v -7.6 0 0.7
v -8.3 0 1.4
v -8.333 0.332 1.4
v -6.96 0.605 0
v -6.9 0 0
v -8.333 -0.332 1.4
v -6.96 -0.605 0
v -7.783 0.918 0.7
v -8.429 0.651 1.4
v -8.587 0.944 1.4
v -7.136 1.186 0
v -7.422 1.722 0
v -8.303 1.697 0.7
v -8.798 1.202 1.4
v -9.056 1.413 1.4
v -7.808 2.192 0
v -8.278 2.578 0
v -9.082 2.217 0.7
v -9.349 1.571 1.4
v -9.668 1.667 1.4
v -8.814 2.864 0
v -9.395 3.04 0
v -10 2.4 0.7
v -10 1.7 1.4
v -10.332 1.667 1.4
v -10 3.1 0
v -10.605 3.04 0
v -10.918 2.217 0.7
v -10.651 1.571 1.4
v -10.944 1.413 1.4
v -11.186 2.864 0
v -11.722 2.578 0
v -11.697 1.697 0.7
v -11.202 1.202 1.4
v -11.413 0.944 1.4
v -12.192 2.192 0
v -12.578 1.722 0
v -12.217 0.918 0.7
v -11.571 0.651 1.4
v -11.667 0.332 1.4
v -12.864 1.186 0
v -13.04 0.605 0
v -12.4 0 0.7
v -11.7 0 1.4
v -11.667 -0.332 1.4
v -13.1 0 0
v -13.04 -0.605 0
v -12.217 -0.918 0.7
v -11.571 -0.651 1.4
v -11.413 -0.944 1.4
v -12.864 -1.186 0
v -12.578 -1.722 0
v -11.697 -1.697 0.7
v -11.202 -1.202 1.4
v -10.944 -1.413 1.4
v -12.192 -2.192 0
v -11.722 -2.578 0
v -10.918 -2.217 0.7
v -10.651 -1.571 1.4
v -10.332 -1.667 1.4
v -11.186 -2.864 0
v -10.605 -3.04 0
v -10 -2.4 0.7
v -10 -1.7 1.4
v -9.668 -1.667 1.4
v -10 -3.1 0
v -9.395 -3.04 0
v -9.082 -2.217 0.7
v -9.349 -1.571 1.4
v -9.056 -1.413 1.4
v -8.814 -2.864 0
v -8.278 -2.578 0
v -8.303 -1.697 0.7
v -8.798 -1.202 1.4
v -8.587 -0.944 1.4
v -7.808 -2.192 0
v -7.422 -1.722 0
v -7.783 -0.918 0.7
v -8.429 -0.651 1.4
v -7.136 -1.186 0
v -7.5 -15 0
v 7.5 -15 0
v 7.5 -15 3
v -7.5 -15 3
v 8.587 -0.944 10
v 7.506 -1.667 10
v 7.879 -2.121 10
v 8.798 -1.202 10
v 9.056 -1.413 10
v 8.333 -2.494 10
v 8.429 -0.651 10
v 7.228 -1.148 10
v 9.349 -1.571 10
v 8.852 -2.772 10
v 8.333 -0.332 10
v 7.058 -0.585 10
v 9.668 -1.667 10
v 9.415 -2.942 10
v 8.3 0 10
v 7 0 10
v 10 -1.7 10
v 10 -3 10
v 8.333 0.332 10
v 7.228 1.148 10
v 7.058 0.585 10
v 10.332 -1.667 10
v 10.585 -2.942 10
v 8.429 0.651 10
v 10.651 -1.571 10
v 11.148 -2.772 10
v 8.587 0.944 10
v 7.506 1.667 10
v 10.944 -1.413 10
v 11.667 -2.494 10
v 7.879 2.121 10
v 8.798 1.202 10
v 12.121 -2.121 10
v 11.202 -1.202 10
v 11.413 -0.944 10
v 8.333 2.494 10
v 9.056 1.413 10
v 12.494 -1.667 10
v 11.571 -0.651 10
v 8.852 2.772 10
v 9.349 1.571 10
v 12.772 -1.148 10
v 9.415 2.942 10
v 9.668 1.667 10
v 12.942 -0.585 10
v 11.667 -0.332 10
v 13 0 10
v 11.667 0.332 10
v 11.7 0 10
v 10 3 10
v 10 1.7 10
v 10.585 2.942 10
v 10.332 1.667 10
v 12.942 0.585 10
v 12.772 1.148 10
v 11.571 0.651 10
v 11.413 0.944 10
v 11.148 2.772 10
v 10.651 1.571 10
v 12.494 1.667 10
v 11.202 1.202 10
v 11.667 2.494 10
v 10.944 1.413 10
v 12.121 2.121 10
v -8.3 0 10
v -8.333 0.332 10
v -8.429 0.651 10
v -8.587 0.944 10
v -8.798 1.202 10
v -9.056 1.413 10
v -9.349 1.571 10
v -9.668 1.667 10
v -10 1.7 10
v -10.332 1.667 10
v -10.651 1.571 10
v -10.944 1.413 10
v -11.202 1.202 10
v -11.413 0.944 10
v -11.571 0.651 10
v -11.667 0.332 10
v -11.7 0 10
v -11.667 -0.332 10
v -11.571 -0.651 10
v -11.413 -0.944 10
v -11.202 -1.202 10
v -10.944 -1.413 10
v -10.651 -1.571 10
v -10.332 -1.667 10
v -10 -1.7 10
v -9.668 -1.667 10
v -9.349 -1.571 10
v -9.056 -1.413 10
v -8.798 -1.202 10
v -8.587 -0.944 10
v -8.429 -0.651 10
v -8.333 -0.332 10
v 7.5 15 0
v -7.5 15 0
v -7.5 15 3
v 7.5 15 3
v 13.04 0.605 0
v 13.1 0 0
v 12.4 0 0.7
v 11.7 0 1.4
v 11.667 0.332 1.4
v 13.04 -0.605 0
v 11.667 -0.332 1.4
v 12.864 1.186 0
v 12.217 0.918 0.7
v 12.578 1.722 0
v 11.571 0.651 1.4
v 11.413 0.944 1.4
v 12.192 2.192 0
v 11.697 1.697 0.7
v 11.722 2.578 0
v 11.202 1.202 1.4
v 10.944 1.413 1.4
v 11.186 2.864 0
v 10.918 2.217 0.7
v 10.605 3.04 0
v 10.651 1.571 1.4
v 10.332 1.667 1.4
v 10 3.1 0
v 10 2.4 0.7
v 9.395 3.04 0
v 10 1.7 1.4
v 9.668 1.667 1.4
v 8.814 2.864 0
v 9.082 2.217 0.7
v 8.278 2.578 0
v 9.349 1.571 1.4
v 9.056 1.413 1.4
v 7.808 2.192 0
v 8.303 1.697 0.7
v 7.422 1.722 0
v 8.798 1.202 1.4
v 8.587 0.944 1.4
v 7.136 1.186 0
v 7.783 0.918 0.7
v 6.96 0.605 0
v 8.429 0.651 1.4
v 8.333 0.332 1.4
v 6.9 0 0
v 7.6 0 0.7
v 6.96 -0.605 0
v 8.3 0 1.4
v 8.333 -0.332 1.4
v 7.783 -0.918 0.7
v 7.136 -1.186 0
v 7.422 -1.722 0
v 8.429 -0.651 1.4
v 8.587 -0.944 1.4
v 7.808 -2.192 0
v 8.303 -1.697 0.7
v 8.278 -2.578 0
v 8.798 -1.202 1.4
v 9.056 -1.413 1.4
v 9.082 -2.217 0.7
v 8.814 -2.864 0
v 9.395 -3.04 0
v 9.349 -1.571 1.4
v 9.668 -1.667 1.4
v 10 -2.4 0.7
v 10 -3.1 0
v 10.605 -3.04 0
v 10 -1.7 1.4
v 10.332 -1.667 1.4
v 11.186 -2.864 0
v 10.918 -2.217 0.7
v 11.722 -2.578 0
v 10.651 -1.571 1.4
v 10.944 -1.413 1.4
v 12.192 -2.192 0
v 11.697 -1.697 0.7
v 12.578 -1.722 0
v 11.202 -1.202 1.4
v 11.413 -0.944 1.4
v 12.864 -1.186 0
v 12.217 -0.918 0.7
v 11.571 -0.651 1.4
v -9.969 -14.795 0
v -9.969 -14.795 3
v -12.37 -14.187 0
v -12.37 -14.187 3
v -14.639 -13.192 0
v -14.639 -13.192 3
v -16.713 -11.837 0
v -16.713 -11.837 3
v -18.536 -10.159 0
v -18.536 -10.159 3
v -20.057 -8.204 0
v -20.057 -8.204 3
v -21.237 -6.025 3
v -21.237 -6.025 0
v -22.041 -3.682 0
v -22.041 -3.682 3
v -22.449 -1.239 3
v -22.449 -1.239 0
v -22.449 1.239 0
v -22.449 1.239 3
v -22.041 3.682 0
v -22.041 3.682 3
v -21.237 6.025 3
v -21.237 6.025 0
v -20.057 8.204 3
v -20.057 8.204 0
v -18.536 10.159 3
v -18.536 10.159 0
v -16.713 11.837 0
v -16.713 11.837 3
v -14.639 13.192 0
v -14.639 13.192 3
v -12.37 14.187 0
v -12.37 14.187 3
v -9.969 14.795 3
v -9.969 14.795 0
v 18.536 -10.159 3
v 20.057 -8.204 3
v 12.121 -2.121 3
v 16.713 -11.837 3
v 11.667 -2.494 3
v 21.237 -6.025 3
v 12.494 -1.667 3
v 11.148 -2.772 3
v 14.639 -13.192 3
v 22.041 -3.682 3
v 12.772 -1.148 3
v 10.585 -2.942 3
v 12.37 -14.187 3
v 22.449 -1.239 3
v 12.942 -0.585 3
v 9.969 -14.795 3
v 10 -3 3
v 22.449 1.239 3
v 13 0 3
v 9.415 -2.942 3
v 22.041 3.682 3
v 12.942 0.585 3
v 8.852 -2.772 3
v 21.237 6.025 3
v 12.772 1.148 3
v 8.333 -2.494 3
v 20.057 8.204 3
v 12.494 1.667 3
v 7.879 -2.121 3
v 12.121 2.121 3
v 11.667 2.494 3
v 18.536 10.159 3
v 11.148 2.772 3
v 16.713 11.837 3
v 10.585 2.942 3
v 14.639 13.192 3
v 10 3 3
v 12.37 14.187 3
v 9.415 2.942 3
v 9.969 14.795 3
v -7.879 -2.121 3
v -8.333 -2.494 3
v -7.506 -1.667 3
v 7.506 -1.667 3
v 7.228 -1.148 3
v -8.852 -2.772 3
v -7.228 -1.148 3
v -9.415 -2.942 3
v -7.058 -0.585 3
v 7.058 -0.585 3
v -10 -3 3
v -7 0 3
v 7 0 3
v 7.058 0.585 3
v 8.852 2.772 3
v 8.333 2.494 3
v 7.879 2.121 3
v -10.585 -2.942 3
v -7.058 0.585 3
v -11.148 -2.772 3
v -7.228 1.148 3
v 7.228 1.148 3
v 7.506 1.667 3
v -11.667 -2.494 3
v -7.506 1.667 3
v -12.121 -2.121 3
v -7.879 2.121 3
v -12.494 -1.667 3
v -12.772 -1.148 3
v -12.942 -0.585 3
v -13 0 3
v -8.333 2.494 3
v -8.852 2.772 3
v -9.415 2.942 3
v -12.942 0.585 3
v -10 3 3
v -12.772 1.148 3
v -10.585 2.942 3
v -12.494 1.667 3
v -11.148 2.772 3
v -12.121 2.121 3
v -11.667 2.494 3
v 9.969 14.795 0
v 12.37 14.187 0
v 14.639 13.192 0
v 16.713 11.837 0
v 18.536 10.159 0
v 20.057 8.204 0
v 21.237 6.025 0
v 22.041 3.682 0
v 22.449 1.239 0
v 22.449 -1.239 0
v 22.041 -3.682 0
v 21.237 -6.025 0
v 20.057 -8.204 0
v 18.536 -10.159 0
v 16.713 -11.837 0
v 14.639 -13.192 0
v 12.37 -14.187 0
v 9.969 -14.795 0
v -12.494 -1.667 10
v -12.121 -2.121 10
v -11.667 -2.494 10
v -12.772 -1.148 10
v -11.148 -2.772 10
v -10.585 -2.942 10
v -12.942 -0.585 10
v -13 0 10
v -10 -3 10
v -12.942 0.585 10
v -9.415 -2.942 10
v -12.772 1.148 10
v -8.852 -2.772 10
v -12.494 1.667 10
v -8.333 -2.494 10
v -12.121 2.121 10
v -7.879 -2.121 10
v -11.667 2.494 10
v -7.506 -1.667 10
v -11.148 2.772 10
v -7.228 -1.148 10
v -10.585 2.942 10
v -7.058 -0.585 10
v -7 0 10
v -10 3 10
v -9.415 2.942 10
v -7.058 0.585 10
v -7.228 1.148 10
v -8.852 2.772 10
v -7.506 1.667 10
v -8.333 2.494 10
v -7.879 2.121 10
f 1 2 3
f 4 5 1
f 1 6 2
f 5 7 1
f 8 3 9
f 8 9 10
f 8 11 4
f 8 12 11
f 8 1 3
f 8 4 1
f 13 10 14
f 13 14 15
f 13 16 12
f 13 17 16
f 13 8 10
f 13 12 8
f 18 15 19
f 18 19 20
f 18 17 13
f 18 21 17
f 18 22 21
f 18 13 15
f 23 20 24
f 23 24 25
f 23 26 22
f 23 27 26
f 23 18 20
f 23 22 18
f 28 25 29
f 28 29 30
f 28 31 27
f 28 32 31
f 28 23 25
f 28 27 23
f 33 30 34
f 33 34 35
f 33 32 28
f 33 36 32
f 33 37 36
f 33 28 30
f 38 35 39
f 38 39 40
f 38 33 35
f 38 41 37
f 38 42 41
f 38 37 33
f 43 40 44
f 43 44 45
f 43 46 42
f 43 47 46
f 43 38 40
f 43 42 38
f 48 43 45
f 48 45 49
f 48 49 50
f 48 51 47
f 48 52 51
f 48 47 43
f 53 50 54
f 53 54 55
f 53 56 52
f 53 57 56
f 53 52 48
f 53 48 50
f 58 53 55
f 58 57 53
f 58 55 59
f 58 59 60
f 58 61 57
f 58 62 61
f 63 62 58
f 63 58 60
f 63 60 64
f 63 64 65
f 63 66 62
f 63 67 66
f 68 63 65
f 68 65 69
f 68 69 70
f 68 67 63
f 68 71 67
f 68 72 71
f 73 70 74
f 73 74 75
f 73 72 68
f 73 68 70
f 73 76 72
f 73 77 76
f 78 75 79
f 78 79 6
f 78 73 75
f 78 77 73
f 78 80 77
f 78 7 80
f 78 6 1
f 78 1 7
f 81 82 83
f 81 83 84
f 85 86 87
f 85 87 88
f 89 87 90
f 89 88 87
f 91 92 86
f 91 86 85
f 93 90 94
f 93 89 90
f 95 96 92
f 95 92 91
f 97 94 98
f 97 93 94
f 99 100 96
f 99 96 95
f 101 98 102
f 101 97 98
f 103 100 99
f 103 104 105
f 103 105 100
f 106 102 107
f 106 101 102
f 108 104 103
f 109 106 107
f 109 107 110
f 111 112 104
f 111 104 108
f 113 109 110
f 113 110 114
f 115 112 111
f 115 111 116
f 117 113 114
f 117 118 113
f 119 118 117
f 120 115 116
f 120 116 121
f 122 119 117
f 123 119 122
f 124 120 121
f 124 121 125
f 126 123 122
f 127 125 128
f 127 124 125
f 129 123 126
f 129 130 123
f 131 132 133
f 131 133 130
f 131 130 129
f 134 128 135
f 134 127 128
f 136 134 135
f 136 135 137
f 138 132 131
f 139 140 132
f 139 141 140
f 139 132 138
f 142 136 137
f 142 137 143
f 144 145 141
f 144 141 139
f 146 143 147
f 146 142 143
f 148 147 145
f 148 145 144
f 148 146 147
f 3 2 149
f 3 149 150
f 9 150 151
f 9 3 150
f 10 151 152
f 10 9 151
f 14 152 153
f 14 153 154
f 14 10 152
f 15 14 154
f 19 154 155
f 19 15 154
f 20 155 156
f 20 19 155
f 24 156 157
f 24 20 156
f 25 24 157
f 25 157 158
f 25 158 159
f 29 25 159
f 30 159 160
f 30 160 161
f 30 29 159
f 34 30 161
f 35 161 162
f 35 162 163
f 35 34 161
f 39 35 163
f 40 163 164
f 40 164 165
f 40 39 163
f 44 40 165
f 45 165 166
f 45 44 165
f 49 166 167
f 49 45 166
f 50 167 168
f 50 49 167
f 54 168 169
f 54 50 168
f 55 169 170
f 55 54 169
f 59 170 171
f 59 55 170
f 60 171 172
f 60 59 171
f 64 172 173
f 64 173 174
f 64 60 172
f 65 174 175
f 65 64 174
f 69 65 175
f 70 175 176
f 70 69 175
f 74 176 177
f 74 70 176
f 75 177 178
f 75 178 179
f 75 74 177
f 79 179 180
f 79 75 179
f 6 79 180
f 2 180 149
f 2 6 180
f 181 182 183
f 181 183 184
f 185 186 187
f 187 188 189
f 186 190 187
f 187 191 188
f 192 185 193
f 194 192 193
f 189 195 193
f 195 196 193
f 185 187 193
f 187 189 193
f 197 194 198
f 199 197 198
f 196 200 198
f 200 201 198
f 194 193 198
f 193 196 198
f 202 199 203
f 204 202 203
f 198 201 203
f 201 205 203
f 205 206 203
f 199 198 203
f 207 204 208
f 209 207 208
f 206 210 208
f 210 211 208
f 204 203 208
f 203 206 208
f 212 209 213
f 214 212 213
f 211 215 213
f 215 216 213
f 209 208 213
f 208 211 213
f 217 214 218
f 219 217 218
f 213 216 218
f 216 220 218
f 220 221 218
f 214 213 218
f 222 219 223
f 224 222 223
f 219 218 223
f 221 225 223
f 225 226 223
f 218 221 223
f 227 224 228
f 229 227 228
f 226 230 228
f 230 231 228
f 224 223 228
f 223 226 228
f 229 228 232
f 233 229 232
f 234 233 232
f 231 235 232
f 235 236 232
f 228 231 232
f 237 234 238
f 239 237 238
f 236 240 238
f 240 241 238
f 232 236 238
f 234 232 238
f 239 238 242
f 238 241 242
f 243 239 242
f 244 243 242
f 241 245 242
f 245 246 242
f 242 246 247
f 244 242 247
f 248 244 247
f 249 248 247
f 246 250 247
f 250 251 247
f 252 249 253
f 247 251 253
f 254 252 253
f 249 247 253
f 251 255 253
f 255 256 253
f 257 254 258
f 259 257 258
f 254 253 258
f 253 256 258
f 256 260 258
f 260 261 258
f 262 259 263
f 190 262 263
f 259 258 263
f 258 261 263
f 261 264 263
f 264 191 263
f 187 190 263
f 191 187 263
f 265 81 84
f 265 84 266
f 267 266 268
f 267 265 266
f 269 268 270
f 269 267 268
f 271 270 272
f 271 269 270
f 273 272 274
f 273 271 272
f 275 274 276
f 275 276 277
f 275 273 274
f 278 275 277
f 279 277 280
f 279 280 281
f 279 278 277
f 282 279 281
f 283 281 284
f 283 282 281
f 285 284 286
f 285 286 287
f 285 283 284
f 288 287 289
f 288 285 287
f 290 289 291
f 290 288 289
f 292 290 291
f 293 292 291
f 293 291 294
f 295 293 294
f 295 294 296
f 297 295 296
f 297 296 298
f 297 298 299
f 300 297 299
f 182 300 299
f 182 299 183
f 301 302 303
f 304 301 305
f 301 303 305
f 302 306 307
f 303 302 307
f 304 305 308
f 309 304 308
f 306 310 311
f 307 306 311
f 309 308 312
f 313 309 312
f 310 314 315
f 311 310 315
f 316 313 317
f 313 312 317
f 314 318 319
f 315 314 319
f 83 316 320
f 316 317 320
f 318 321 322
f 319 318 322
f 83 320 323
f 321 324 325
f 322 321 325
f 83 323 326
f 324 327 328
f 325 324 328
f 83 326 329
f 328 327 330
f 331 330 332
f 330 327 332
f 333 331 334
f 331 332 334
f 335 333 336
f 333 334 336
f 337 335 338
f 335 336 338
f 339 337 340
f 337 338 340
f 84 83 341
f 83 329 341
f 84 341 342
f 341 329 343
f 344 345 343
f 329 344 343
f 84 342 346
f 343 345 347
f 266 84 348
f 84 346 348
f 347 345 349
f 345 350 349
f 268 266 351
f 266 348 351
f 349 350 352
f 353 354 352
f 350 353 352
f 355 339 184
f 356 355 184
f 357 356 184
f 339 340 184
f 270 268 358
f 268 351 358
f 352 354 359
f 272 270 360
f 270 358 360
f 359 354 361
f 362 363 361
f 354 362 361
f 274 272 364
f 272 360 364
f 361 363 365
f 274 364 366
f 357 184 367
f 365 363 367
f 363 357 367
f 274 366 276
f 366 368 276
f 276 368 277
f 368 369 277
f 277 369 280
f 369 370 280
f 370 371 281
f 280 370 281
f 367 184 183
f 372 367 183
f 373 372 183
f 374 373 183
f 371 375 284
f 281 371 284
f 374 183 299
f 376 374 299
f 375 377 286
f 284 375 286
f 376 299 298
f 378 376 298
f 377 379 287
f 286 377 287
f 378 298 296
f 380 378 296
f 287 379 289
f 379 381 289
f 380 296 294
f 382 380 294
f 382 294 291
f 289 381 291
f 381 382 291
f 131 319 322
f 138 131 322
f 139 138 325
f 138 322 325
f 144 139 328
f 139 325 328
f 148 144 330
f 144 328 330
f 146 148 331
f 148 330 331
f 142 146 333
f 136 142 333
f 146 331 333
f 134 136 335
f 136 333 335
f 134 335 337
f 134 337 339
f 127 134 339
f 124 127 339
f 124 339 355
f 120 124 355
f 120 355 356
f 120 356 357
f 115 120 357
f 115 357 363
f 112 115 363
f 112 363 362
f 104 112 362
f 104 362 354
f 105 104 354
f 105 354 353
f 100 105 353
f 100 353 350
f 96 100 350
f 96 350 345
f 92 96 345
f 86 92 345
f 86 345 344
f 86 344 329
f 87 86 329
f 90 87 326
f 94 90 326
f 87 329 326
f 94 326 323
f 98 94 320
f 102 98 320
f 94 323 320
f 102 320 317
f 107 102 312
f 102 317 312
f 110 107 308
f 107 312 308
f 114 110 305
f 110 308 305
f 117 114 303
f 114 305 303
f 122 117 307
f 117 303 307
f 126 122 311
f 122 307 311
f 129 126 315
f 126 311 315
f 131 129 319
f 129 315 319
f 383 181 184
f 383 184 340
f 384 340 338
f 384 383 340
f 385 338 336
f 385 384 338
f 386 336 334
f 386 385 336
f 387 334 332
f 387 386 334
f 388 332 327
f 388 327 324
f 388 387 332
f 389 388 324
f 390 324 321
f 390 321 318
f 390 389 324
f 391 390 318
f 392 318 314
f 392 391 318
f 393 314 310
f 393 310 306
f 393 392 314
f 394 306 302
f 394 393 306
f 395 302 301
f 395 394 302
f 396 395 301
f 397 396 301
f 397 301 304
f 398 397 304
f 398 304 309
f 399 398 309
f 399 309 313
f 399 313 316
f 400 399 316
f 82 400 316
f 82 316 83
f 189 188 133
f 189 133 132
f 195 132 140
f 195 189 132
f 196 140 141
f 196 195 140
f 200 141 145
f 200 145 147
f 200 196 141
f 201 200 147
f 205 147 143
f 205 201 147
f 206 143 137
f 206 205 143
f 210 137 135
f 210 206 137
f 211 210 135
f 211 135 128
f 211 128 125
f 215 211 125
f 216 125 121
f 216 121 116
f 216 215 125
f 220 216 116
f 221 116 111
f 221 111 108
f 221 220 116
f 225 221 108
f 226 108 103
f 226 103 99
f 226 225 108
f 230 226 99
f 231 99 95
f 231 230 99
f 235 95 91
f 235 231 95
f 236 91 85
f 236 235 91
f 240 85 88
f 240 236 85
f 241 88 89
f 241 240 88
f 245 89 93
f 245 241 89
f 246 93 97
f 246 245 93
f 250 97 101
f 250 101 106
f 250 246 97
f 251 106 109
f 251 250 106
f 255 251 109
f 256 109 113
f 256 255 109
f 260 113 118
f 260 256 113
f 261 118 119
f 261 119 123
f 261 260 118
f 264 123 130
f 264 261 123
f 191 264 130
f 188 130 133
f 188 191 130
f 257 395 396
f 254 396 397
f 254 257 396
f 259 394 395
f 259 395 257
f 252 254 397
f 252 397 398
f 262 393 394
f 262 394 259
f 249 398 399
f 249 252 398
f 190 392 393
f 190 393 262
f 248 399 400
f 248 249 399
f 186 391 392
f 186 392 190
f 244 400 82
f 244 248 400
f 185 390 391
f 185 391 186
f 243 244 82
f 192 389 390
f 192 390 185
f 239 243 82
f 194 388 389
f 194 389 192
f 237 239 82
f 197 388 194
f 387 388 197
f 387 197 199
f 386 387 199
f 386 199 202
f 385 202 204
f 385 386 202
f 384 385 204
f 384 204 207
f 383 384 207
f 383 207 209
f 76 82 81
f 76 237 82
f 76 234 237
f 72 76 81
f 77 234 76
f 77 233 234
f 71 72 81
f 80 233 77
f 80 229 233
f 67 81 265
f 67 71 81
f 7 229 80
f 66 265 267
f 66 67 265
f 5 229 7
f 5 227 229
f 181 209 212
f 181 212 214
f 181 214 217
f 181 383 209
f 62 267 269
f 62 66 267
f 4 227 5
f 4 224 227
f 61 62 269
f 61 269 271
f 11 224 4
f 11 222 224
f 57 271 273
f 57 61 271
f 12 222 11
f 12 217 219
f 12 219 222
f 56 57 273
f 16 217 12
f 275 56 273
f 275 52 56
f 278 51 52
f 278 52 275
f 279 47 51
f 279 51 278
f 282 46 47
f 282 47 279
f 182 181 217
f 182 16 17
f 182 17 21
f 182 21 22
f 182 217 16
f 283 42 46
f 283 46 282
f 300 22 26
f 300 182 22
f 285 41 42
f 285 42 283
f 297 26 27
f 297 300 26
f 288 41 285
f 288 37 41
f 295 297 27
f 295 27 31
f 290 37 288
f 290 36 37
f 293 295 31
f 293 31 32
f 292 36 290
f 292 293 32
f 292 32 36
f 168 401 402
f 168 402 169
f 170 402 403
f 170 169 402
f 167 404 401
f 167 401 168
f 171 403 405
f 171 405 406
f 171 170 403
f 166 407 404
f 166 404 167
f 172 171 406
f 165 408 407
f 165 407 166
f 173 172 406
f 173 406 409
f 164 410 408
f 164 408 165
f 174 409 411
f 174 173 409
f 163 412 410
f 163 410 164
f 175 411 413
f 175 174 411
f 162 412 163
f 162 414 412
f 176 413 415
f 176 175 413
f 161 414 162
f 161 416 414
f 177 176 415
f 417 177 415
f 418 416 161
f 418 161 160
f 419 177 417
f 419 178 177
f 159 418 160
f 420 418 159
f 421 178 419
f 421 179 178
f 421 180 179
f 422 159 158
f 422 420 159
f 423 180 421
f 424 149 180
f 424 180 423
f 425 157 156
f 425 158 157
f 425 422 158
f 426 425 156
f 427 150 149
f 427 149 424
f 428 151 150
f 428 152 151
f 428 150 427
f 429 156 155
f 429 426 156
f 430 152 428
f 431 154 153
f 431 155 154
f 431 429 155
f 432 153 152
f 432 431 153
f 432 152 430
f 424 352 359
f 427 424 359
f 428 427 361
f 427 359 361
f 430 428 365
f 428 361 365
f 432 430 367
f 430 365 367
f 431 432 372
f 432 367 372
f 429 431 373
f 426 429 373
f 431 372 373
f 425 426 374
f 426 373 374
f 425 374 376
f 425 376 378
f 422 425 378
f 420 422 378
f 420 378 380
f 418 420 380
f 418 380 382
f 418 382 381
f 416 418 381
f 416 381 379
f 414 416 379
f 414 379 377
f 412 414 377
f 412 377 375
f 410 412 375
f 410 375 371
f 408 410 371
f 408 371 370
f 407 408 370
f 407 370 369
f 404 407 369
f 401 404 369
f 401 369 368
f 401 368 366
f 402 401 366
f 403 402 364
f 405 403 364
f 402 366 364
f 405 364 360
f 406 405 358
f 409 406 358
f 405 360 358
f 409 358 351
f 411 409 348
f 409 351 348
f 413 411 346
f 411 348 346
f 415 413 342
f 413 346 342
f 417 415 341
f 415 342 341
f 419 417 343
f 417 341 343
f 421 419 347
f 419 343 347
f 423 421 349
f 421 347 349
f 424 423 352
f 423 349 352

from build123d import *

# Parameters (mm, degrees)
SKETCH_1_R      = 3
EXTRUDE_1_DEPTH = 3
SKETCH_1_3_R    = 3
SKETCH_1_3_R_2  = 1.7
EXTRUDE_2_DEPTH = 10
CHAMFER_1_SIZE  = 1.4


with BuildPart() as part:
    # 草图1 → 凸台-拉伸1 (new body)
    with BuildSketch(Plane.XY):
        with BuildLine():
            Line((7.5, 15), (-7.5, 15))
            ThreePointArc((-7.5, 15), (-22.5, 0), (-7.5, -15))
            Line((-7.5, -15), (7.5, -15))
            ThreePointArc((7.5, -15), (22.5, 0), (7.5, 15))
        make_face()
        with Locations((-10, 0)):
            Circle(SKETCH_1_R, mode=Mode.SUBTRACT)
        with Locations((10, 0)):
            Circle(SKETCH_1_R, mode=Mode.SUBTRACT)
    extrude(amount=EXTRUDE_1_DEPTH)

    # 草图1<3> → 凸台-拉伸2 (add)
    # profile 1 of 2: a face of its own
    with BuildSketch(Plane.XY):
        with Locations((-10, 0)):
            Circle(SKETCH_1_3_R)
        with Locations((-10, 0)):
            Circle(SKETCH_1_3_R_2, mode=Mode.SUBTRACT)
    # profile 2 of 2: a face of its own
    with BuildSketch(Plane.XY):
        with Locations((10, 0)):
            Circle(SKETCH_1_3_R)
        with Locations((10, 0)):
            Circle(SKETCH_1_3_R_2, mode=Mode.SUBTRACT)
    extrude(amount=EXTRUDE_2_DEPTH)

    # 倒角1
    chamfer_1_edges = [part.edges().sort_by_distance(p)[0] for p in [
        (8.3, 0, 0),
        (-11.7, 0, 0),
    ]]
    chamfer(chamfer_1_edges, length=CHAMFER_1_SIZE)


solid = part.part
